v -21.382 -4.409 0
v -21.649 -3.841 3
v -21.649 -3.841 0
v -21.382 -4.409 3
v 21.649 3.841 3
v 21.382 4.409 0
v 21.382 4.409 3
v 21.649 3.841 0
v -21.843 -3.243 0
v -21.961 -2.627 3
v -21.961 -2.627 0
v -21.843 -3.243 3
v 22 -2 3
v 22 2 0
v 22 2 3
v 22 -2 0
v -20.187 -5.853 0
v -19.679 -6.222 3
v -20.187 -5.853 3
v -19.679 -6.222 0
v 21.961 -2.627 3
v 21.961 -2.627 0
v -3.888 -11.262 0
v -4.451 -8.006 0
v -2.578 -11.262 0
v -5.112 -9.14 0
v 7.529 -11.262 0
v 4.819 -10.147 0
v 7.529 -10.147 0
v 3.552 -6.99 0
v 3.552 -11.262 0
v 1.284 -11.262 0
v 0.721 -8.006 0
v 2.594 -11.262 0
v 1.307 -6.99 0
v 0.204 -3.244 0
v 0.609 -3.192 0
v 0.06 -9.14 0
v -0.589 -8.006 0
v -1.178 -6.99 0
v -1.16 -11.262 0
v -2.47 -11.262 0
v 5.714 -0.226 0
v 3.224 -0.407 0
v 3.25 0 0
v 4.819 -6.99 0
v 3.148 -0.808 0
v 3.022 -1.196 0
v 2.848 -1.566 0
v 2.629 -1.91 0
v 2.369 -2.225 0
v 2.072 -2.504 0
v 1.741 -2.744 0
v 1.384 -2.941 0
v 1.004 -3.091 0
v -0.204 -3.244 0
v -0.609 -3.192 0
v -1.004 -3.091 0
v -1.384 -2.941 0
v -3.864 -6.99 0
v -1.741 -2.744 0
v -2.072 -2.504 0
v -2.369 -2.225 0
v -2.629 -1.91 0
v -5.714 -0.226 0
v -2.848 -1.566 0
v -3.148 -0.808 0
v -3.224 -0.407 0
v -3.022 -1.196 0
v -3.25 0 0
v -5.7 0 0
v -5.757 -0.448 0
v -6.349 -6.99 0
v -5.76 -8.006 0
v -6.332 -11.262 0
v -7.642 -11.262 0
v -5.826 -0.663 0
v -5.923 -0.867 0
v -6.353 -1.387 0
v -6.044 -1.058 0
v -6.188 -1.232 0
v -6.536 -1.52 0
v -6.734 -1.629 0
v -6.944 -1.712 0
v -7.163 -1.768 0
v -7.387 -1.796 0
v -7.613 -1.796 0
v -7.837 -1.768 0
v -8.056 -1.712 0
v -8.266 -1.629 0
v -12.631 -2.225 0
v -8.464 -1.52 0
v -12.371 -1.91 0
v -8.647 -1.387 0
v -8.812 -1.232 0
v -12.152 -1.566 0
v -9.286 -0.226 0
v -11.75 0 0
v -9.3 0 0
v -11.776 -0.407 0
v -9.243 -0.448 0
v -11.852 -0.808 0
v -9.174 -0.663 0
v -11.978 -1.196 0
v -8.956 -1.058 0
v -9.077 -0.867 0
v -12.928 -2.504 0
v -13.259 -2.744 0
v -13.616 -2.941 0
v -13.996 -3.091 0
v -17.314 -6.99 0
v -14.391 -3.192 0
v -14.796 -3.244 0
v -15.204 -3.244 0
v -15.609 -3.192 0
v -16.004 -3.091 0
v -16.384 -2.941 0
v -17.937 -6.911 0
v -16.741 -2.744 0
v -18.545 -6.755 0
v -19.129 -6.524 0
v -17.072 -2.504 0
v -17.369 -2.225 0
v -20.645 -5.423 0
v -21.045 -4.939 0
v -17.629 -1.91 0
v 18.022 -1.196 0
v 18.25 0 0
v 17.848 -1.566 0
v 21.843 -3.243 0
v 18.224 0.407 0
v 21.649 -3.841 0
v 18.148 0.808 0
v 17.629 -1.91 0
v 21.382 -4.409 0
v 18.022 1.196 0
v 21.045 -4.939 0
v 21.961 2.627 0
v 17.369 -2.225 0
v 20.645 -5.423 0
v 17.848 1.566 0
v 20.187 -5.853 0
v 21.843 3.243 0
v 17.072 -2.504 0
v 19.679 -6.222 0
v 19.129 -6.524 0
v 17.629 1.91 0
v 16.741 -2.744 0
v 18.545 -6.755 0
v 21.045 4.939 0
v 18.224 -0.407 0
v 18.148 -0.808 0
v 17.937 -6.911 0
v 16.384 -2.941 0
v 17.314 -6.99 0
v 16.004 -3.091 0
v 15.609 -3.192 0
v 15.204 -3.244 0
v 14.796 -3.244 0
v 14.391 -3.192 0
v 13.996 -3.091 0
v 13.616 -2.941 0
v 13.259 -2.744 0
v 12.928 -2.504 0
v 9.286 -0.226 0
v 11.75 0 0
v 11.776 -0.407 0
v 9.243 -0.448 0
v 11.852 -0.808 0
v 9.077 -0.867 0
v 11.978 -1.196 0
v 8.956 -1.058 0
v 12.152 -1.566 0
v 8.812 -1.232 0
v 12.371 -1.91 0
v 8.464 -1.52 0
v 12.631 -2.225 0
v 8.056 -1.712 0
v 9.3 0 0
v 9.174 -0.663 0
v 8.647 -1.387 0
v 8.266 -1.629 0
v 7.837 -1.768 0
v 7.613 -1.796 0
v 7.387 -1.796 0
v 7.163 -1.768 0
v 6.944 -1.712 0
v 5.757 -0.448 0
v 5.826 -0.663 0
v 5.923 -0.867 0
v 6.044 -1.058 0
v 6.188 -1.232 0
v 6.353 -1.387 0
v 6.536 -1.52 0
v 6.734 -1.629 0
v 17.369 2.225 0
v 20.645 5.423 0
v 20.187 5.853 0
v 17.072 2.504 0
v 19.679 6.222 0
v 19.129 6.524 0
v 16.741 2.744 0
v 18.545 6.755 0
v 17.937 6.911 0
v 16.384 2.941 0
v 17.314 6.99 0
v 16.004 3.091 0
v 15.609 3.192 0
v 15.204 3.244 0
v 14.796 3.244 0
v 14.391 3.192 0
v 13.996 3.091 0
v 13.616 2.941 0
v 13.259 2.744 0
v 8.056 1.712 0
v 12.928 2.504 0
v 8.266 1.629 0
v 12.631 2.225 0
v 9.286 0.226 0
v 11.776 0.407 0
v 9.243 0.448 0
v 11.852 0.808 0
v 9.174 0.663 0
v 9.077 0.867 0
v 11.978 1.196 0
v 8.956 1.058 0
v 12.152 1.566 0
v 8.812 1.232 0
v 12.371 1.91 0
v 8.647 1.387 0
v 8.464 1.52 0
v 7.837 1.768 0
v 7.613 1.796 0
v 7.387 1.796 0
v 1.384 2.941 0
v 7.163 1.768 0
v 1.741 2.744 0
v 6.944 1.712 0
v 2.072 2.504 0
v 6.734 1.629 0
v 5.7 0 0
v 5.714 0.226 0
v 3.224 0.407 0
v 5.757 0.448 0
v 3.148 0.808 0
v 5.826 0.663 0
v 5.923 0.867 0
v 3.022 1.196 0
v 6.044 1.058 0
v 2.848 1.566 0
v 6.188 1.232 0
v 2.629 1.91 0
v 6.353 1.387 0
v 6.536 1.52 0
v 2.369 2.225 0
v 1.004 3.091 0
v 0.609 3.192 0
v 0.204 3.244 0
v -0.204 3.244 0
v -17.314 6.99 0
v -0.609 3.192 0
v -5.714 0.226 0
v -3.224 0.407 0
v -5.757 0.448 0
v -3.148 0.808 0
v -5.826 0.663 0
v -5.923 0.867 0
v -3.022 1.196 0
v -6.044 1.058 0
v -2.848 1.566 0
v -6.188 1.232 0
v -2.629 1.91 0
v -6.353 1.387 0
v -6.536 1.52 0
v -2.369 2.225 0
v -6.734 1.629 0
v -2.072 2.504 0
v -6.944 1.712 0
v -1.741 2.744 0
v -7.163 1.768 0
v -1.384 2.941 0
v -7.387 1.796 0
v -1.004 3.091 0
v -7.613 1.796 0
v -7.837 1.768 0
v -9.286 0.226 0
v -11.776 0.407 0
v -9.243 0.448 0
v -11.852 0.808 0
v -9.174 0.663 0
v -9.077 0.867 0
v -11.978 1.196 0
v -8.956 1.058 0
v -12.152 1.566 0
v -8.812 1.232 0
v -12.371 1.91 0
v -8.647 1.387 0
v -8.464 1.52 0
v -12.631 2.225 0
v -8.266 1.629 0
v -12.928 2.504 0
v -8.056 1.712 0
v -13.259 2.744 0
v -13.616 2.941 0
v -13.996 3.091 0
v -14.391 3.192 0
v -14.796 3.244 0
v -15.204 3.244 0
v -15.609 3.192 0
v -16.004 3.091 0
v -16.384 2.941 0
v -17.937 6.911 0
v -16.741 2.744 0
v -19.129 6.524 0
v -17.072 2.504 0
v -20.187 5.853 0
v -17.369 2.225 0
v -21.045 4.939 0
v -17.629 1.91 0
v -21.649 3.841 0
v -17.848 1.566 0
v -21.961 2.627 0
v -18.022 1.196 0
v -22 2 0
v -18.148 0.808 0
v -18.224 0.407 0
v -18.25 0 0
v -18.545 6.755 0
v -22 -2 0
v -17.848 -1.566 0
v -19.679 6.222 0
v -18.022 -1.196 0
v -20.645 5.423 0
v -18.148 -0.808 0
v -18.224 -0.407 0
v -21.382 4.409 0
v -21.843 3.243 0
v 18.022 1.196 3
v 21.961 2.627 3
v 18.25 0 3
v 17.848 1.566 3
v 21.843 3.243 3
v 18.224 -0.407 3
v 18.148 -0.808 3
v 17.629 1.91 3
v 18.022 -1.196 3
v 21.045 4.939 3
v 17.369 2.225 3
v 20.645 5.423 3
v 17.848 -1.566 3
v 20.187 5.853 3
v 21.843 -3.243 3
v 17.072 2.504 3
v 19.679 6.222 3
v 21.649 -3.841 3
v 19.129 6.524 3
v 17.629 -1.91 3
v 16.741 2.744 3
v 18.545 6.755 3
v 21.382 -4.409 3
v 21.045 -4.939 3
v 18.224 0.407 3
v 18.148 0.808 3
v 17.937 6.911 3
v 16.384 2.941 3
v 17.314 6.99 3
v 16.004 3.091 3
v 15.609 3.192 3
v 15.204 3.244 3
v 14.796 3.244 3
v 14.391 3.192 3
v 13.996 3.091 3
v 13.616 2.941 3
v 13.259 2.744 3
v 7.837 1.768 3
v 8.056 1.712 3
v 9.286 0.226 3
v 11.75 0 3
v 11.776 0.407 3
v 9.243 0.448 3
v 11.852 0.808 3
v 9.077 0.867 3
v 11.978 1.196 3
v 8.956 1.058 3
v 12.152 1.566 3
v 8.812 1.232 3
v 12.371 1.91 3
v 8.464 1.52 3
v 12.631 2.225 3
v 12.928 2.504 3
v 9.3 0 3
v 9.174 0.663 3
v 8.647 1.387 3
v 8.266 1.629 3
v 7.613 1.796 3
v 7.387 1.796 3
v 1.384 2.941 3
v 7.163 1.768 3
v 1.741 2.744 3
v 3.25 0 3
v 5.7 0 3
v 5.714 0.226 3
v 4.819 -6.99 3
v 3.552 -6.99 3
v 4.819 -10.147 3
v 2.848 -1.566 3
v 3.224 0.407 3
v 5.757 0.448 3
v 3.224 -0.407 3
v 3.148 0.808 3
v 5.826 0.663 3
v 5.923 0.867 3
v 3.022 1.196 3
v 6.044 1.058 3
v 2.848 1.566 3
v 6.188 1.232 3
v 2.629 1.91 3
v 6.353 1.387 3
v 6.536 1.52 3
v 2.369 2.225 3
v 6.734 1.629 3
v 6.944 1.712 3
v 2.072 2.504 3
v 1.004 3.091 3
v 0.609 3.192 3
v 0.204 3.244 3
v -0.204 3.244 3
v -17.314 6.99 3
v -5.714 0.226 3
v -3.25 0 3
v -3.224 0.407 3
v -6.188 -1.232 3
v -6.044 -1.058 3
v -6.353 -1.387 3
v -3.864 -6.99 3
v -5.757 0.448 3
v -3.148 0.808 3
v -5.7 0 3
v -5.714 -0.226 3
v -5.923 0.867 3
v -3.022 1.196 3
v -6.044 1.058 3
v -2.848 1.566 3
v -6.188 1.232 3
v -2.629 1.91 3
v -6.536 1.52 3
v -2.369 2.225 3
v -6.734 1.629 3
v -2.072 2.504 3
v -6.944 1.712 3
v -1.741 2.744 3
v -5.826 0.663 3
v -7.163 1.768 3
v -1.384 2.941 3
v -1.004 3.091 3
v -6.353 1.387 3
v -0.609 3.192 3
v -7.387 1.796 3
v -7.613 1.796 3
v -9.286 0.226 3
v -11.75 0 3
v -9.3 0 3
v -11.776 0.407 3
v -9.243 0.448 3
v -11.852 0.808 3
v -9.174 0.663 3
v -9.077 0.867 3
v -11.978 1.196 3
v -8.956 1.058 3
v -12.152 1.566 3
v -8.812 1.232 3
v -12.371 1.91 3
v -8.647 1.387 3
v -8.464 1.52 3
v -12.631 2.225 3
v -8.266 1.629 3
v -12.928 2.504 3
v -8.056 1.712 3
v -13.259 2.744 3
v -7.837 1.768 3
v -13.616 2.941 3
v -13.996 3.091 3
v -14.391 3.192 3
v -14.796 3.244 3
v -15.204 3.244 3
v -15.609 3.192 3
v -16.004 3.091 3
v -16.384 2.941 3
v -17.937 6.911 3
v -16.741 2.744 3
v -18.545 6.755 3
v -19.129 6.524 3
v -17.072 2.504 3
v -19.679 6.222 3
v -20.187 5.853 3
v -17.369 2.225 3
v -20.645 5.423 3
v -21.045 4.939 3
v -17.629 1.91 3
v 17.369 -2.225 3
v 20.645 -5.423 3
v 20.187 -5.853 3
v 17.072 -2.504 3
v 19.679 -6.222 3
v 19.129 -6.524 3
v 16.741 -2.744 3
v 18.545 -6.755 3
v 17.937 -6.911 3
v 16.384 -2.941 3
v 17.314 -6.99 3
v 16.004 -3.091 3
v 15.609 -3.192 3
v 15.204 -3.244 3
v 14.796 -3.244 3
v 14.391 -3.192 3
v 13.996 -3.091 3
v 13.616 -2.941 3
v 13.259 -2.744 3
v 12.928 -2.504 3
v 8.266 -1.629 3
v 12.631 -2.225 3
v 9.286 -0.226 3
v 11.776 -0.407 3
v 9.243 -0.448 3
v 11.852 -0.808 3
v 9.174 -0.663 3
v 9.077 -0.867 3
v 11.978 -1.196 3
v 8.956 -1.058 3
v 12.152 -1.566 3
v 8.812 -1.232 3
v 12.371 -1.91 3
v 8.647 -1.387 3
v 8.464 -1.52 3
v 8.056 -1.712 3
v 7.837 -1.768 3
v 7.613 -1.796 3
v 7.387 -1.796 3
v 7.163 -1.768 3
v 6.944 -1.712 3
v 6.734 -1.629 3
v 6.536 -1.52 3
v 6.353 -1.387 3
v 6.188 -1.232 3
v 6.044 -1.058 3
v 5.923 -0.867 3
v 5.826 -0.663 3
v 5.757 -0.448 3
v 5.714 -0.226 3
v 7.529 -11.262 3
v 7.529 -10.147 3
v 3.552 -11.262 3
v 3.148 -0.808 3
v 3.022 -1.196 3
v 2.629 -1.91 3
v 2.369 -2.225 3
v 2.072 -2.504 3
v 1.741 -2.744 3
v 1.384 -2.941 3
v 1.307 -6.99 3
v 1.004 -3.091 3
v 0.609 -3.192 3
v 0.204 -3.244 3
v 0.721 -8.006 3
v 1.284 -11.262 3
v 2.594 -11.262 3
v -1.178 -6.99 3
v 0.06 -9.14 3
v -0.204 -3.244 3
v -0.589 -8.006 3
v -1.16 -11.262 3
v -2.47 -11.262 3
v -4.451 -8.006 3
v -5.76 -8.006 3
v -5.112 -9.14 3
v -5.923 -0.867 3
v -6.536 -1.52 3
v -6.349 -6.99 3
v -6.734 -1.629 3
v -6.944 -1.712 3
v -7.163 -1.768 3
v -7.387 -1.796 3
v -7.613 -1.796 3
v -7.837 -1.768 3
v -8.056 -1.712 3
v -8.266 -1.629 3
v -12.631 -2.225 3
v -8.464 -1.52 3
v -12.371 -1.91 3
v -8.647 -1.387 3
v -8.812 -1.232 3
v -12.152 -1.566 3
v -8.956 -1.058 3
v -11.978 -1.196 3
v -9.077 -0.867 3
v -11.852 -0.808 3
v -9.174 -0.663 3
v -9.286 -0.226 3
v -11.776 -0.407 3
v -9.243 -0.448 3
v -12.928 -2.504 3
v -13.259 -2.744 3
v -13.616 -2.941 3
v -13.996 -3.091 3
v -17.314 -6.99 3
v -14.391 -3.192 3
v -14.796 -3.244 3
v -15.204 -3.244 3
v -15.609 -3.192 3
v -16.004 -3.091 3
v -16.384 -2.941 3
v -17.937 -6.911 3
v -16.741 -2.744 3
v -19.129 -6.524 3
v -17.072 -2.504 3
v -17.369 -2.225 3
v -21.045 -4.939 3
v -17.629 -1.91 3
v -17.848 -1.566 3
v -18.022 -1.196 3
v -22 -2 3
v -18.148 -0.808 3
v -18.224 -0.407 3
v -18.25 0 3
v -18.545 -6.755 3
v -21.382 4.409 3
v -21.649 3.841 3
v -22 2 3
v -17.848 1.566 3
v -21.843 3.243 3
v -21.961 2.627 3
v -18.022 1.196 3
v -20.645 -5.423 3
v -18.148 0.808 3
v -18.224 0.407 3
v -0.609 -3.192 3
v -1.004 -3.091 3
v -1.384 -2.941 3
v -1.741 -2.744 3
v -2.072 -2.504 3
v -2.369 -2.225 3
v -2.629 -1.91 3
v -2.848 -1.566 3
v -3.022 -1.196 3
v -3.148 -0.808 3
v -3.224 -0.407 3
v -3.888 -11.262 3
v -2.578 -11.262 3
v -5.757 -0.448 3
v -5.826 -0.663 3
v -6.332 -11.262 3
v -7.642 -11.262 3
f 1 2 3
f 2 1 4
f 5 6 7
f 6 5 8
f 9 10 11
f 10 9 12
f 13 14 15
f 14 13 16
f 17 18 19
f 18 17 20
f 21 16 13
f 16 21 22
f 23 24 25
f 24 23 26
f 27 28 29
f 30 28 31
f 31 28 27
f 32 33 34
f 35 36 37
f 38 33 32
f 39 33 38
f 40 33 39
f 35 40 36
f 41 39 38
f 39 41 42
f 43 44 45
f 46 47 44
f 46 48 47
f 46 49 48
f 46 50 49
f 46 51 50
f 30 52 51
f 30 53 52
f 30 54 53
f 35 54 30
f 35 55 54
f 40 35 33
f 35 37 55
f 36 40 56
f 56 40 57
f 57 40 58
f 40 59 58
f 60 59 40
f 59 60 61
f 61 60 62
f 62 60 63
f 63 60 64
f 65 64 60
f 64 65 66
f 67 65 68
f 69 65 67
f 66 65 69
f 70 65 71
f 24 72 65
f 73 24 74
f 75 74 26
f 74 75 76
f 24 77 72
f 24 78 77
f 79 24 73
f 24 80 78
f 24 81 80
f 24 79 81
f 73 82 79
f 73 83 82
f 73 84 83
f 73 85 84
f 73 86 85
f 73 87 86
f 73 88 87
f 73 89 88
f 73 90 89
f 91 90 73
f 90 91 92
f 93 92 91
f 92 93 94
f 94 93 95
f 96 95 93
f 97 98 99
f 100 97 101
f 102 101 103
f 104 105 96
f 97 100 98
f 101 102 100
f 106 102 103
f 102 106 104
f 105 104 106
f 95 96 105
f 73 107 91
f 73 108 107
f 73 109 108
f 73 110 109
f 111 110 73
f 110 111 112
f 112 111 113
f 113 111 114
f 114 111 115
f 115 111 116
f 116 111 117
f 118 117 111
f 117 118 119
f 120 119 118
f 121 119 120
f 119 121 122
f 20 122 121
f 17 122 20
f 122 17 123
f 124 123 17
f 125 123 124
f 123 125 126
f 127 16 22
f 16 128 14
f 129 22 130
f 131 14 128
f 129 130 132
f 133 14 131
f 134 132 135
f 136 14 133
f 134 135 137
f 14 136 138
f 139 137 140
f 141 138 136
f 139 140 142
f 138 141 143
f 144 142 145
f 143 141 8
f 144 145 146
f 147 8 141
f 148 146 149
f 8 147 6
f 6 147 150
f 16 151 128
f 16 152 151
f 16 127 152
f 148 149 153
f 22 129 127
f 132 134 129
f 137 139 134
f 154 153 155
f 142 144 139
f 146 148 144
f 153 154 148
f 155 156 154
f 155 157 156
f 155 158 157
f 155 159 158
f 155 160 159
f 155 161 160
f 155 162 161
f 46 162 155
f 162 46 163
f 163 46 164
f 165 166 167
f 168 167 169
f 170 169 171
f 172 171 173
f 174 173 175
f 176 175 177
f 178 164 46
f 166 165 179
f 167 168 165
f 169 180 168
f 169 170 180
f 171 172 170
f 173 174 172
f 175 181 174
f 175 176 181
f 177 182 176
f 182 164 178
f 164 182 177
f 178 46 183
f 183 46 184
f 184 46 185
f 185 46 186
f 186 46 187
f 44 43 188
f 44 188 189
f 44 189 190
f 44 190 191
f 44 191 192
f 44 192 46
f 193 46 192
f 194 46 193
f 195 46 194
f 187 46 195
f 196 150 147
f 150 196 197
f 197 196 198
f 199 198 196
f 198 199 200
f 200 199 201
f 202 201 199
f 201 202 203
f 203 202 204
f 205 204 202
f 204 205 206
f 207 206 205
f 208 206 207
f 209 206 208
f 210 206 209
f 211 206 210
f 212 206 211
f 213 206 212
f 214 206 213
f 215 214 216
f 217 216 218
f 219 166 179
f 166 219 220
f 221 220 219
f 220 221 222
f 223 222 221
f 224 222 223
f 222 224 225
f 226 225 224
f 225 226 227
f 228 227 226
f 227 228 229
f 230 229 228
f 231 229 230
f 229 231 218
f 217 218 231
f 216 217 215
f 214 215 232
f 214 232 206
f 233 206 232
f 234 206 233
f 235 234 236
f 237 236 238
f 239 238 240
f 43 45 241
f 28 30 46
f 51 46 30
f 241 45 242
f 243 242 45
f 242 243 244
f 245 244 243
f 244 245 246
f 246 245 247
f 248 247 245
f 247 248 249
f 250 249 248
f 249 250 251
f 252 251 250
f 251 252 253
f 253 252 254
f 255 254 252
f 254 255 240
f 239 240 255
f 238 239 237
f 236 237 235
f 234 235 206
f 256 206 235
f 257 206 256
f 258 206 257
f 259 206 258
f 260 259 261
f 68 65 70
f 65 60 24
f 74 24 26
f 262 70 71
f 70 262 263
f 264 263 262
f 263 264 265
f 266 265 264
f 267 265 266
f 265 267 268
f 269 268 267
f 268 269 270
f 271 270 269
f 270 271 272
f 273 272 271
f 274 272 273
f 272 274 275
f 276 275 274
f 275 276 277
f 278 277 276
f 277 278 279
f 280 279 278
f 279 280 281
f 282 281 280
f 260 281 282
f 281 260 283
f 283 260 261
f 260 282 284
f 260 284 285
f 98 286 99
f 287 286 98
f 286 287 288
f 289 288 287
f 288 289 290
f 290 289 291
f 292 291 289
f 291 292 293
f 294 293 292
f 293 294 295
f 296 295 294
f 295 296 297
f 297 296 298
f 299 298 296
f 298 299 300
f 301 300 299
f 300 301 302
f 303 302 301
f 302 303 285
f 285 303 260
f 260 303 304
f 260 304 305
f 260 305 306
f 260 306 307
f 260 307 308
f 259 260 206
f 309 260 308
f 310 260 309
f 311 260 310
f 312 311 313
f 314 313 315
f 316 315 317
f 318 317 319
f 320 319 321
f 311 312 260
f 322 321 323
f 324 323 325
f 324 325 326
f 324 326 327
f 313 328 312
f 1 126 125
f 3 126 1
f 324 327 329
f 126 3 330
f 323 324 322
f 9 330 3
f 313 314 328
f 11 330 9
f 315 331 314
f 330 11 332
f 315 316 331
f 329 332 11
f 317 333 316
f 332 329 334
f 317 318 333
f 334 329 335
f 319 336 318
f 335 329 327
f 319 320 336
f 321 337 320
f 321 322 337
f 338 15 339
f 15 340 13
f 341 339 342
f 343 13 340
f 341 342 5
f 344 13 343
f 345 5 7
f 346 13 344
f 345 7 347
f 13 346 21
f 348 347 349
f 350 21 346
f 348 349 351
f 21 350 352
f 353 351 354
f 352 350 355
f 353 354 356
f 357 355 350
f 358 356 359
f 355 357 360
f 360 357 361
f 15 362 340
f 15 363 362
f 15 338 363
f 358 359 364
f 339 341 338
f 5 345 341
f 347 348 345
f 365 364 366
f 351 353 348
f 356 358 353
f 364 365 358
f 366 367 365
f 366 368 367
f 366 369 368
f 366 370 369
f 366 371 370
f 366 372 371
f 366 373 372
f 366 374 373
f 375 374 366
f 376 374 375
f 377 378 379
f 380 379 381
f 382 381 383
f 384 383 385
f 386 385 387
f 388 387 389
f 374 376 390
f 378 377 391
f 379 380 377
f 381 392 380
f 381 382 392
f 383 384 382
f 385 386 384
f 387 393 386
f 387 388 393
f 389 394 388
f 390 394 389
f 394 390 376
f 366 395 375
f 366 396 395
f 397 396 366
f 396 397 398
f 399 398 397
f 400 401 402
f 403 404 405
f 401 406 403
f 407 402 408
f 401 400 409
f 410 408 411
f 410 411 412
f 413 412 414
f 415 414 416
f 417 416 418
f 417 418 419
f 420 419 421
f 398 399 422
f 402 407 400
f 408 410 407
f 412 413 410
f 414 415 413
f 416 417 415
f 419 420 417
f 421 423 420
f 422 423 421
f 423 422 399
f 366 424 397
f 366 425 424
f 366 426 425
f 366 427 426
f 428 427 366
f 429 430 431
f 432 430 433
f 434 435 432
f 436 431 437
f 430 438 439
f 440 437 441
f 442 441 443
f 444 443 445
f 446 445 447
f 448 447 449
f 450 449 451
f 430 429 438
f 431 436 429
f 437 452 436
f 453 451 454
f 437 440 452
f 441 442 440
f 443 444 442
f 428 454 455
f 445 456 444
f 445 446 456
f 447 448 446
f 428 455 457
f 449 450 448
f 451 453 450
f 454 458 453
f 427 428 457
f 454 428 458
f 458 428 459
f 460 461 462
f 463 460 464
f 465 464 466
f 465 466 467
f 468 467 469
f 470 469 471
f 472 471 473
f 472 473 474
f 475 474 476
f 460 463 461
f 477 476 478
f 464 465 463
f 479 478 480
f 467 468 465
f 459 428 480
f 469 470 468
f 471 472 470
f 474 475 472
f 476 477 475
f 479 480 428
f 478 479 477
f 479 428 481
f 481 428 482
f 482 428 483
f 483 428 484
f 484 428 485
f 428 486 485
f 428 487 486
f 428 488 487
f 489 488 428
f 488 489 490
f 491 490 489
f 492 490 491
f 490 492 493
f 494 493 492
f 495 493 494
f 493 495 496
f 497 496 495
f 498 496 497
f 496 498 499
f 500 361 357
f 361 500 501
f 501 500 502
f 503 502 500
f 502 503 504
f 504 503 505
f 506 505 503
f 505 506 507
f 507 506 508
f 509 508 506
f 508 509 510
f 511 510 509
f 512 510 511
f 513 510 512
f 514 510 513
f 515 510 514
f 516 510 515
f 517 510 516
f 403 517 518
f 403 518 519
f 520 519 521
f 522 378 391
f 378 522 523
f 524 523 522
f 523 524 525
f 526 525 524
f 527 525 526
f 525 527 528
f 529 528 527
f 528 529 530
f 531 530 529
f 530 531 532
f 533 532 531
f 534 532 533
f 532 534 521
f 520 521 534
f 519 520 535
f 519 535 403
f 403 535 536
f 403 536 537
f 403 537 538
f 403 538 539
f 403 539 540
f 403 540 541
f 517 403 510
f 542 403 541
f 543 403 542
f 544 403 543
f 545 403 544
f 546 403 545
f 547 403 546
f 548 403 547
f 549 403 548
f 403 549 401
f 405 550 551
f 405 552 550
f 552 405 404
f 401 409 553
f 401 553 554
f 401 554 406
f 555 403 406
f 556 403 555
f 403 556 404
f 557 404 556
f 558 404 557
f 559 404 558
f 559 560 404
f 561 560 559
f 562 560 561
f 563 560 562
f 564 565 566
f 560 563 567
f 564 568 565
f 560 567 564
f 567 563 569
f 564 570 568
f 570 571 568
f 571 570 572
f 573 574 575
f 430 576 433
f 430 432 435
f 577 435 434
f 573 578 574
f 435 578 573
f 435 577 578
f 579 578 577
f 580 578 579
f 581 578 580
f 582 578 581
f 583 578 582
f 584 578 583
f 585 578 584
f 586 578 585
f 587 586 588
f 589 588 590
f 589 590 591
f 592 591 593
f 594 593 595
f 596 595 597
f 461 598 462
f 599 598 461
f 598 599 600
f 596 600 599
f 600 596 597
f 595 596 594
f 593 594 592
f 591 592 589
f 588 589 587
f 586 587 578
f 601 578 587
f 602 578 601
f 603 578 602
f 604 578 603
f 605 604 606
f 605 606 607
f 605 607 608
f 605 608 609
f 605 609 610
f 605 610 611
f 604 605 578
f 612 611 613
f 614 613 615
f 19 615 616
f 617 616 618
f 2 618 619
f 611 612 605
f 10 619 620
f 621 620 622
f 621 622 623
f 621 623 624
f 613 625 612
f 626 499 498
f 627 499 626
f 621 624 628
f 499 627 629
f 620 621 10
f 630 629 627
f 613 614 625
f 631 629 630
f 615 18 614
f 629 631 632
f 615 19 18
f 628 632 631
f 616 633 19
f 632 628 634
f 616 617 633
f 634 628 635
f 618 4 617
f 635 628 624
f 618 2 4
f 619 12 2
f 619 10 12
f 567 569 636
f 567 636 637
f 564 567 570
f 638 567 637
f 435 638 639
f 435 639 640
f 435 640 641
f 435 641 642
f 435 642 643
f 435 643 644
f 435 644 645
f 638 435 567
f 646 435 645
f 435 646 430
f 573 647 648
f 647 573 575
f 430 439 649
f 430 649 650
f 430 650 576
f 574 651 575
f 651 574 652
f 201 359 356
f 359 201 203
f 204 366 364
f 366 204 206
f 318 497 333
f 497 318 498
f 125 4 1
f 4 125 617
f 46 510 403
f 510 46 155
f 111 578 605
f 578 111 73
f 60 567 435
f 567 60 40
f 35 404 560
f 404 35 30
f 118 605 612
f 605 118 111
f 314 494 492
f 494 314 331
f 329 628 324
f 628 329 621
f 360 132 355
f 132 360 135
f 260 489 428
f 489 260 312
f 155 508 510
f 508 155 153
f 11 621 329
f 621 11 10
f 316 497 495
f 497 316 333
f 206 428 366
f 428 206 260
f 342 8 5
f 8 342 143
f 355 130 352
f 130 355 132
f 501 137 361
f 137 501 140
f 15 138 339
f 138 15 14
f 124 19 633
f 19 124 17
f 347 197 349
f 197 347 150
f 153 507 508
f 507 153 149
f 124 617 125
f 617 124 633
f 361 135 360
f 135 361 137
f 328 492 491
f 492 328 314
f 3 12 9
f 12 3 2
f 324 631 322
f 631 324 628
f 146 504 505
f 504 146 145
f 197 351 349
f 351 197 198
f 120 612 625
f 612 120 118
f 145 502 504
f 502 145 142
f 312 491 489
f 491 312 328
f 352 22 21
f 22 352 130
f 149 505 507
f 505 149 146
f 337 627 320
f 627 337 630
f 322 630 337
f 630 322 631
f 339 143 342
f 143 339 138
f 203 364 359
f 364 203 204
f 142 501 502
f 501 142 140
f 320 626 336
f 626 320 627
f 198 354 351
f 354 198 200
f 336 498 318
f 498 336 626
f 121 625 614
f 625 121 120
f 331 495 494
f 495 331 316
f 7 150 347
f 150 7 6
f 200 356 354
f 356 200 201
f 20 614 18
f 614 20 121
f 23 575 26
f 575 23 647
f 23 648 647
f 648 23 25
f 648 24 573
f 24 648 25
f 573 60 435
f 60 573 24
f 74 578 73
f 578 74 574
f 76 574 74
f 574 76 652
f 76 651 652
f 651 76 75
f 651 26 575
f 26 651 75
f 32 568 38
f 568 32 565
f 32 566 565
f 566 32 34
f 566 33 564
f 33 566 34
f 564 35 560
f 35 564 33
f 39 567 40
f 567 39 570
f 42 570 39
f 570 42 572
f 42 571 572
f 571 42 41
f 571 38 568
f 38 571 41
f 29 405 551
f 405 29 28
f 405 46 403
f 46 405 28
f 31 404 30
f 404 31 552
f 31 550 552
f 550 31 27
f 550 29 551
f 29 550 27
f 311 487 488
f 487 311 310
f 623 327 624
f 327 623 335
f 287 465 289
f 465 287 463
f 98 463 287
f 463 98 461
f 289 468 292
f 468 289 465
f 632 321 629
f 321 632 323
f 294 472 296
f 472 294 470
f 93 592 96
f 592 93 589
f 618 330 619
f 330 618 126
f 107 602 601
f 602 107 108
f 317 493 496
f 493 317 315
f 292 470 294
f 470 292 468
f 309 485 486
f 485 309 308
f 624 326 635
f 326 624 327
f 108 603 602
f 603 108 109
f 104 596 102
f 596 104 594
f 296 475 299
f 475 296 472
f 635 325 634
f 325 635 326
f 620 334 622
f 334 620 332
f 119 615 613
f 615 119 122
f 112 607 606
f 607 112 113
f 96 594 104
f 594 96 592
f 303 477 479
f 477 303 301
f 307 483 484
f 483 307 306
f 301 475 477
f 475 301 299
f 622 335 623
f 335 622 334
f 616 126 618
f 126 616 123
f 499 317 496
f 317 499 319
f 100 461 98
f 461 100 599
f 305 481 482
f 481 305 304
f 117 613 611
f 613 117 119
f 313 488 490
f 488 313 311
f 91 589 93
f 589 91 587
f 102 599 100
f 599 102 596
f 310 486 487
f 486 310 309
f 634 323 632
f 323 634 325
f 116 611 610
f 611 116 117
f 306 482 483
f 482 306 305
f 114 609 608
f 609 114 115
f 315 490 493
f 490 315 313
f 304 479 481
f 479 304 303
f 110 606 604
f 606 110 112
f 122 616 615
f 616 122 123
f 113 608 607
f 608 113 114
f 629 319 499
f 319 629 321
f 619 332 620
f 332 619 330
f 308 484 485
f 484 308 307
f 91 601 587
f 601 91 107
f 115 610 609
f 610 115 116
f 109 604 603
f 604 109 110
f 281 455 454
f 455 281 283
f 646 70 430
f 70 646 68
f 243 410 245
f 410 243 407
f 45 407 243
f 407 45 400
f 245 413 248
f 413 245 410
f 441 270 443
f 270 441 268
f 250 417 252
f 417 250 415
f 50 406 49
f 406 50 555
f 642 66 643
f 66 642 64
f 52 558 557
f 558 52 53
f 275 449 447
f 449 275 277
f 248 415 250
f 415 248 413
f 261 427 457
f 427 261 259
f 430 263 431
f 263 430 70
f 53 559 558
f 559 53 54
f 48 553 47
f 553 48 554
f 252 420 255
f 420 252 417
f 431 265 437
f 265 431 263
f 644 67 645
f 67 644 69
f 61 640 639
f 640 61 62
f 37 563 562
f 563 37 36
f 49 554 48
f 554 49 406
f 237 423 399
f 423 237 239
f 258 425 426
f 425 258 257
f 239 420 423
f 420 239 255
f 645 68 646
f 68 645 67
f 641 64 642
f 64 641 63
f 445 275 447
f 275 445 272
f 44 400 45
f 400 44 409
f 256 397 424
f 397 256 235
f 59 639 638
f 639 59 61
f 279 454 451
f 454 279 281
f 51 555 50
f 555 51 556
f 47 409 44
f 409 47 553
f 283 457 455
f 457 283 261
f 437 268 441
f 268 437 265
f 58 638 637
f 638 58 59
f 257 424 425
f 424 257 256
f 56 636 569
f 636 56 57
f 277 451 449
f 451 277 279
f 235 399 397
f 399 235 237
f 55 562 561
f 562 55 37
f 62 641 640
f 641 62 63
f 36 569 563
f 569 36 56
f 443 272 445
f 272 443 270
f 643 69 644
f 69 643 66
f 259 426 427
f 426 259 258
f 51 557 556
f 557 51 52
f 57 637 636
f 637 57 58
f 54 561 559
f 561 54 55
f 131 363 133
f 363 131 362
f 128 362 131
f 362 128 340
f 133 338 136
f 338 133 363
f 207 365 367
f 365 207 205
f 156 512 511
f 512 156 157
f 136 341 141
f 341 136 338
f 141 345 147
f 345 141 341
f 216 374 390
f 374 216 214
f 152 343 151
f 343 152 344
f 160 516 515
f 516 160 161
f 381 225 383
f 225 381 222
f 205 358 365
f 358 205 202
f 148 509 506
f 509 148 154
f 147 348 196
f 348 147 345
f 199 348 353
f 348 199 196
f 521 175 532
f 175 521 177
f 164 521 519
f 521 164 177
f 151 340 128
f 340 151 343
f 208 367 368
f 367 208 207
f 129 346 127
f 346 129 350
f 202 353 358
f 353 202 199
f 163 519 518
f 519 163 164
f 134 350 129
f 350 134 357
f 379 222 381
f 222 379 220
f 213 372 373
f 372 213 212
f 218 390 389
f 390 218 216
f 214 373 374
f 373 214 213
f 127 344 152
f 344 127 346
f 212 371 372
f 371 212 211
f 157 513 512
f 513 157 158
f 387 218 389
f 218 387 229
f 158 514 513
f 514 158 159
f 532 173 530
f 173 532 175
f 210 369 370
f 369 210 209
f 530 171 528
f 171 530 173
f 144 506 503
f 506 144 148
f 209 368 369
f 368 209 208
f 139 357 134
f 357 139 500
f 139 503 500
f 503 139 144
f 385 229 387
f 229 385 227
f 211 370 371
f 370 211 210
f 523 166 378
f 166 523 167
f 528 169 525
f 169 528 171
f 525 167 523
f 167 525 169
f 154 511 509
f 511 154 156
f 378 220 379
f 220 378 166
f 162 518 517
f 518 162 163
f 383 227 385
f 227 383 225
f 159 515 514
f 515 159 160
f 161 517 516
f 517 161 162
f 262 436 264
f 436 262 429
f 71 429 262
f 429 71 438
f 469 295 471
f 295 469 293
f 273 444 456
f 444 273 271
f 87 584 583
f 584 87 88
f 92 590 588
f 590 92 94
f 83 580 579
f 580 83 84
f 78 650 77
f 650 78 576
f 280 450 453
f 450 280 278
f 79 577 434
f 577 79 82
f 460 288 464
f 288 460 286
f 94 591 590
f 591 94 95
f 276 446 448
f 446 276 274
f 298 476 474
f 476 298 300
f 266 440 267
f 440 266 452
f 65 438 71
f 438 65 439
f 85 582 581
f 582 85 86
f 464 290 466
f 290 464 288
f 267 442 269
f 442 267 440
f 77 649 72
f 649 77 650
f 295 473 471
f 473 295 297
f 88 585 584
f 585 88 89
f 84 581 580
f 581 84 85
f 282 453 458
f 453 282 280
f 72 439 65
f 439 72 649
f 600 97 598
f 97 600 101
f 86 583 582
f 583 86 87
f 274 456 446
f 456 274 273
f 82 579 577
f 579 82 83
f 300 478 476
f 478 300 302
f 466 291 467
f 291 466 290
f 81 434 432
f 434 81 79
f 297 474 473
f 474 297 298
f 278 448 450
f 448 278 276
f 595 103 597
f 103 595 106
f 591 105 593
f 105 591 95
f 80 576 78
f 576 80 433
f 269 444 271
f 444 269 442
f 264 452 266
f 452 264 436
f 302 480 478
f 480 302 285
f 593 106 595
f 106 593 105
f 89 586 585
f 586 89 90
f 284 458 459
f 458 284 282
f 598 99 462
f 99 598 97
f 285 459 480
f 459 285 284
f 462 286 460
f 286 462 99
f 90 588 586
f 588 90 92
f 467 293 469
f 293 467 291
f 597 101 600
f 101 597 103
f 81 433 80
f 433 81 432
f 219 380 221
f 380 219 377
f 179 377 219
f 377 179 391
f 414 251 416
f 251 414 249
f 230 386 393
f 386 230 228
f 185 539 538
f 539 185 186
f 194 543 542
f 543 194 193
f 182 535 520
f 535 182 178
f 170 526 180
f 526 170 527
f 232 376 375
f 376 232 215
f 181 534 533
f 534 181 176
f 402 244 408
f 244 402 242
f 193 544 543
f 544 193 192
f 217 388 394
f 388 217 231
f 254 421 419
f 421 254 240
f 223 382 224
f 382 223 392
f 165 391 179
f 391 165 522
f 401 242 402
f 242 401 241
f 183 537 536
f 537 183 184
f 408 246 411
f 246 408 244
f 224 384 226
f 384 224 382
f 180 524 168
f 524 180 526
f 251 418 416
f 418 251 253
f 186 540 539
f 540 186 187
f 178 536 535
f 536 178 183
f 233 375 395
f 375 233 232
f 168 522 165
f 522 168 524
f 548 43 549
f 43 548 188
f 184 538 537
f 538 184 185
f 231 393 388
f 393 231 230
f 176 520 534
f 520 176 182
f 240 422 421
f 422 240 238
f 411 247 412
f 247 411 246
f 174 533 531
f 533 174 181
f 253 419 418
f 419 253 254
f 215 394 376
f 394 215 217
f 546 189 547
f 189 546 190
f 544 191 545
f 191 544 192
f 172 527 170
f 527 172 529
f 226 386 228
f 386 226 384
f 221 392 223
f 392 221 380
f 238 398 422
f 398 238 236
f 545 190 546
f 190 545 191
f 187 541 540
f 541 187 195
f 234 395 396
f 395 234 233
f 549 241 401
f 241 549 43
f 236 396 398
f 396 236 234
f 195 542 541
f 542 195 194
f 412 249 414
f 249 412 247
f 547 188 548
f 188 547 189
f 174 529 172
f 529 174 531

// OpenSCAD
$fn = 50;


difference() {
	union() {
		hull() {
			translate(v = [-17.0000000000, 2.0000000000, 0]) {
				cylinder(h = 3, r = 5);
			}
			translate(v = [17.0000000000, 2.0000000000, 0]) {
				cylinder(h = 3, r = 5);
			}
			translate(v = [-17.0000000000, -2.0000000000, 0]) {
				cylinder(h = 3, r = 5);
			}
			translate(v = [17.0000000000, -2.0000000000, 0]) {
				cylinder(h = 3, r = 5);
			}
		}
		translate(v = [0, -5, 0]) {
			linear_extrude(height = 3) {
				text(font = "DejaVu Sans Mono:style=Bold", halign = "center", size = 6.3333333333, text = "XXL", valign = "top");
			}
		}
	}
	union() {
		translate(v = [-15.0000000000, 0.0000000000, 0]) {
			translate(v = [0, 0, -100]) {
				cylinder(h = 200, r = 3.2500000000);
			}
		}
		translate(v = [0, 0, -100]) {
			cylinder(h = 200, r = 3.2500000000);
		}
		translate(v = [15.0000000000, 0.0000000000, 0]) {
			translate(v = [0, 0, -100]) {
				cylinder(h = 200, r = 3.2500000000);
			}
		}
		translate(v = [-15.0000000000, 0.0000000000, 0]) {
			translate(v = [0, 0, -100]) {
				cylinder(h = 200, r = 1.8000000000);
			}
		}
		translate(v = [-7.5000000000, 0.0000000000, 0]) {
			translate(v = [0, 0, -100]) {
				cylinder(h = 200, r = 1.8000000000);
			}
		}
		translate(v = [0, 0, -100]) {
			cylinder(h = 200, r = 1.8000000000);
		}
		translate(v = [7.5000000000, 0.0000000000, 0]) {
			translate(v = [0, 0, -100]) {
				cylinder(h = 200, r = 1.8000000000);
			}
		}
		translate(v = [15.0000000000, 0.0000000000, 0]) {
			translate(v = [0, 0, -100]) {
				cylinder(h = 200, r = 1.8000000000);
			}
		}
	}
}
